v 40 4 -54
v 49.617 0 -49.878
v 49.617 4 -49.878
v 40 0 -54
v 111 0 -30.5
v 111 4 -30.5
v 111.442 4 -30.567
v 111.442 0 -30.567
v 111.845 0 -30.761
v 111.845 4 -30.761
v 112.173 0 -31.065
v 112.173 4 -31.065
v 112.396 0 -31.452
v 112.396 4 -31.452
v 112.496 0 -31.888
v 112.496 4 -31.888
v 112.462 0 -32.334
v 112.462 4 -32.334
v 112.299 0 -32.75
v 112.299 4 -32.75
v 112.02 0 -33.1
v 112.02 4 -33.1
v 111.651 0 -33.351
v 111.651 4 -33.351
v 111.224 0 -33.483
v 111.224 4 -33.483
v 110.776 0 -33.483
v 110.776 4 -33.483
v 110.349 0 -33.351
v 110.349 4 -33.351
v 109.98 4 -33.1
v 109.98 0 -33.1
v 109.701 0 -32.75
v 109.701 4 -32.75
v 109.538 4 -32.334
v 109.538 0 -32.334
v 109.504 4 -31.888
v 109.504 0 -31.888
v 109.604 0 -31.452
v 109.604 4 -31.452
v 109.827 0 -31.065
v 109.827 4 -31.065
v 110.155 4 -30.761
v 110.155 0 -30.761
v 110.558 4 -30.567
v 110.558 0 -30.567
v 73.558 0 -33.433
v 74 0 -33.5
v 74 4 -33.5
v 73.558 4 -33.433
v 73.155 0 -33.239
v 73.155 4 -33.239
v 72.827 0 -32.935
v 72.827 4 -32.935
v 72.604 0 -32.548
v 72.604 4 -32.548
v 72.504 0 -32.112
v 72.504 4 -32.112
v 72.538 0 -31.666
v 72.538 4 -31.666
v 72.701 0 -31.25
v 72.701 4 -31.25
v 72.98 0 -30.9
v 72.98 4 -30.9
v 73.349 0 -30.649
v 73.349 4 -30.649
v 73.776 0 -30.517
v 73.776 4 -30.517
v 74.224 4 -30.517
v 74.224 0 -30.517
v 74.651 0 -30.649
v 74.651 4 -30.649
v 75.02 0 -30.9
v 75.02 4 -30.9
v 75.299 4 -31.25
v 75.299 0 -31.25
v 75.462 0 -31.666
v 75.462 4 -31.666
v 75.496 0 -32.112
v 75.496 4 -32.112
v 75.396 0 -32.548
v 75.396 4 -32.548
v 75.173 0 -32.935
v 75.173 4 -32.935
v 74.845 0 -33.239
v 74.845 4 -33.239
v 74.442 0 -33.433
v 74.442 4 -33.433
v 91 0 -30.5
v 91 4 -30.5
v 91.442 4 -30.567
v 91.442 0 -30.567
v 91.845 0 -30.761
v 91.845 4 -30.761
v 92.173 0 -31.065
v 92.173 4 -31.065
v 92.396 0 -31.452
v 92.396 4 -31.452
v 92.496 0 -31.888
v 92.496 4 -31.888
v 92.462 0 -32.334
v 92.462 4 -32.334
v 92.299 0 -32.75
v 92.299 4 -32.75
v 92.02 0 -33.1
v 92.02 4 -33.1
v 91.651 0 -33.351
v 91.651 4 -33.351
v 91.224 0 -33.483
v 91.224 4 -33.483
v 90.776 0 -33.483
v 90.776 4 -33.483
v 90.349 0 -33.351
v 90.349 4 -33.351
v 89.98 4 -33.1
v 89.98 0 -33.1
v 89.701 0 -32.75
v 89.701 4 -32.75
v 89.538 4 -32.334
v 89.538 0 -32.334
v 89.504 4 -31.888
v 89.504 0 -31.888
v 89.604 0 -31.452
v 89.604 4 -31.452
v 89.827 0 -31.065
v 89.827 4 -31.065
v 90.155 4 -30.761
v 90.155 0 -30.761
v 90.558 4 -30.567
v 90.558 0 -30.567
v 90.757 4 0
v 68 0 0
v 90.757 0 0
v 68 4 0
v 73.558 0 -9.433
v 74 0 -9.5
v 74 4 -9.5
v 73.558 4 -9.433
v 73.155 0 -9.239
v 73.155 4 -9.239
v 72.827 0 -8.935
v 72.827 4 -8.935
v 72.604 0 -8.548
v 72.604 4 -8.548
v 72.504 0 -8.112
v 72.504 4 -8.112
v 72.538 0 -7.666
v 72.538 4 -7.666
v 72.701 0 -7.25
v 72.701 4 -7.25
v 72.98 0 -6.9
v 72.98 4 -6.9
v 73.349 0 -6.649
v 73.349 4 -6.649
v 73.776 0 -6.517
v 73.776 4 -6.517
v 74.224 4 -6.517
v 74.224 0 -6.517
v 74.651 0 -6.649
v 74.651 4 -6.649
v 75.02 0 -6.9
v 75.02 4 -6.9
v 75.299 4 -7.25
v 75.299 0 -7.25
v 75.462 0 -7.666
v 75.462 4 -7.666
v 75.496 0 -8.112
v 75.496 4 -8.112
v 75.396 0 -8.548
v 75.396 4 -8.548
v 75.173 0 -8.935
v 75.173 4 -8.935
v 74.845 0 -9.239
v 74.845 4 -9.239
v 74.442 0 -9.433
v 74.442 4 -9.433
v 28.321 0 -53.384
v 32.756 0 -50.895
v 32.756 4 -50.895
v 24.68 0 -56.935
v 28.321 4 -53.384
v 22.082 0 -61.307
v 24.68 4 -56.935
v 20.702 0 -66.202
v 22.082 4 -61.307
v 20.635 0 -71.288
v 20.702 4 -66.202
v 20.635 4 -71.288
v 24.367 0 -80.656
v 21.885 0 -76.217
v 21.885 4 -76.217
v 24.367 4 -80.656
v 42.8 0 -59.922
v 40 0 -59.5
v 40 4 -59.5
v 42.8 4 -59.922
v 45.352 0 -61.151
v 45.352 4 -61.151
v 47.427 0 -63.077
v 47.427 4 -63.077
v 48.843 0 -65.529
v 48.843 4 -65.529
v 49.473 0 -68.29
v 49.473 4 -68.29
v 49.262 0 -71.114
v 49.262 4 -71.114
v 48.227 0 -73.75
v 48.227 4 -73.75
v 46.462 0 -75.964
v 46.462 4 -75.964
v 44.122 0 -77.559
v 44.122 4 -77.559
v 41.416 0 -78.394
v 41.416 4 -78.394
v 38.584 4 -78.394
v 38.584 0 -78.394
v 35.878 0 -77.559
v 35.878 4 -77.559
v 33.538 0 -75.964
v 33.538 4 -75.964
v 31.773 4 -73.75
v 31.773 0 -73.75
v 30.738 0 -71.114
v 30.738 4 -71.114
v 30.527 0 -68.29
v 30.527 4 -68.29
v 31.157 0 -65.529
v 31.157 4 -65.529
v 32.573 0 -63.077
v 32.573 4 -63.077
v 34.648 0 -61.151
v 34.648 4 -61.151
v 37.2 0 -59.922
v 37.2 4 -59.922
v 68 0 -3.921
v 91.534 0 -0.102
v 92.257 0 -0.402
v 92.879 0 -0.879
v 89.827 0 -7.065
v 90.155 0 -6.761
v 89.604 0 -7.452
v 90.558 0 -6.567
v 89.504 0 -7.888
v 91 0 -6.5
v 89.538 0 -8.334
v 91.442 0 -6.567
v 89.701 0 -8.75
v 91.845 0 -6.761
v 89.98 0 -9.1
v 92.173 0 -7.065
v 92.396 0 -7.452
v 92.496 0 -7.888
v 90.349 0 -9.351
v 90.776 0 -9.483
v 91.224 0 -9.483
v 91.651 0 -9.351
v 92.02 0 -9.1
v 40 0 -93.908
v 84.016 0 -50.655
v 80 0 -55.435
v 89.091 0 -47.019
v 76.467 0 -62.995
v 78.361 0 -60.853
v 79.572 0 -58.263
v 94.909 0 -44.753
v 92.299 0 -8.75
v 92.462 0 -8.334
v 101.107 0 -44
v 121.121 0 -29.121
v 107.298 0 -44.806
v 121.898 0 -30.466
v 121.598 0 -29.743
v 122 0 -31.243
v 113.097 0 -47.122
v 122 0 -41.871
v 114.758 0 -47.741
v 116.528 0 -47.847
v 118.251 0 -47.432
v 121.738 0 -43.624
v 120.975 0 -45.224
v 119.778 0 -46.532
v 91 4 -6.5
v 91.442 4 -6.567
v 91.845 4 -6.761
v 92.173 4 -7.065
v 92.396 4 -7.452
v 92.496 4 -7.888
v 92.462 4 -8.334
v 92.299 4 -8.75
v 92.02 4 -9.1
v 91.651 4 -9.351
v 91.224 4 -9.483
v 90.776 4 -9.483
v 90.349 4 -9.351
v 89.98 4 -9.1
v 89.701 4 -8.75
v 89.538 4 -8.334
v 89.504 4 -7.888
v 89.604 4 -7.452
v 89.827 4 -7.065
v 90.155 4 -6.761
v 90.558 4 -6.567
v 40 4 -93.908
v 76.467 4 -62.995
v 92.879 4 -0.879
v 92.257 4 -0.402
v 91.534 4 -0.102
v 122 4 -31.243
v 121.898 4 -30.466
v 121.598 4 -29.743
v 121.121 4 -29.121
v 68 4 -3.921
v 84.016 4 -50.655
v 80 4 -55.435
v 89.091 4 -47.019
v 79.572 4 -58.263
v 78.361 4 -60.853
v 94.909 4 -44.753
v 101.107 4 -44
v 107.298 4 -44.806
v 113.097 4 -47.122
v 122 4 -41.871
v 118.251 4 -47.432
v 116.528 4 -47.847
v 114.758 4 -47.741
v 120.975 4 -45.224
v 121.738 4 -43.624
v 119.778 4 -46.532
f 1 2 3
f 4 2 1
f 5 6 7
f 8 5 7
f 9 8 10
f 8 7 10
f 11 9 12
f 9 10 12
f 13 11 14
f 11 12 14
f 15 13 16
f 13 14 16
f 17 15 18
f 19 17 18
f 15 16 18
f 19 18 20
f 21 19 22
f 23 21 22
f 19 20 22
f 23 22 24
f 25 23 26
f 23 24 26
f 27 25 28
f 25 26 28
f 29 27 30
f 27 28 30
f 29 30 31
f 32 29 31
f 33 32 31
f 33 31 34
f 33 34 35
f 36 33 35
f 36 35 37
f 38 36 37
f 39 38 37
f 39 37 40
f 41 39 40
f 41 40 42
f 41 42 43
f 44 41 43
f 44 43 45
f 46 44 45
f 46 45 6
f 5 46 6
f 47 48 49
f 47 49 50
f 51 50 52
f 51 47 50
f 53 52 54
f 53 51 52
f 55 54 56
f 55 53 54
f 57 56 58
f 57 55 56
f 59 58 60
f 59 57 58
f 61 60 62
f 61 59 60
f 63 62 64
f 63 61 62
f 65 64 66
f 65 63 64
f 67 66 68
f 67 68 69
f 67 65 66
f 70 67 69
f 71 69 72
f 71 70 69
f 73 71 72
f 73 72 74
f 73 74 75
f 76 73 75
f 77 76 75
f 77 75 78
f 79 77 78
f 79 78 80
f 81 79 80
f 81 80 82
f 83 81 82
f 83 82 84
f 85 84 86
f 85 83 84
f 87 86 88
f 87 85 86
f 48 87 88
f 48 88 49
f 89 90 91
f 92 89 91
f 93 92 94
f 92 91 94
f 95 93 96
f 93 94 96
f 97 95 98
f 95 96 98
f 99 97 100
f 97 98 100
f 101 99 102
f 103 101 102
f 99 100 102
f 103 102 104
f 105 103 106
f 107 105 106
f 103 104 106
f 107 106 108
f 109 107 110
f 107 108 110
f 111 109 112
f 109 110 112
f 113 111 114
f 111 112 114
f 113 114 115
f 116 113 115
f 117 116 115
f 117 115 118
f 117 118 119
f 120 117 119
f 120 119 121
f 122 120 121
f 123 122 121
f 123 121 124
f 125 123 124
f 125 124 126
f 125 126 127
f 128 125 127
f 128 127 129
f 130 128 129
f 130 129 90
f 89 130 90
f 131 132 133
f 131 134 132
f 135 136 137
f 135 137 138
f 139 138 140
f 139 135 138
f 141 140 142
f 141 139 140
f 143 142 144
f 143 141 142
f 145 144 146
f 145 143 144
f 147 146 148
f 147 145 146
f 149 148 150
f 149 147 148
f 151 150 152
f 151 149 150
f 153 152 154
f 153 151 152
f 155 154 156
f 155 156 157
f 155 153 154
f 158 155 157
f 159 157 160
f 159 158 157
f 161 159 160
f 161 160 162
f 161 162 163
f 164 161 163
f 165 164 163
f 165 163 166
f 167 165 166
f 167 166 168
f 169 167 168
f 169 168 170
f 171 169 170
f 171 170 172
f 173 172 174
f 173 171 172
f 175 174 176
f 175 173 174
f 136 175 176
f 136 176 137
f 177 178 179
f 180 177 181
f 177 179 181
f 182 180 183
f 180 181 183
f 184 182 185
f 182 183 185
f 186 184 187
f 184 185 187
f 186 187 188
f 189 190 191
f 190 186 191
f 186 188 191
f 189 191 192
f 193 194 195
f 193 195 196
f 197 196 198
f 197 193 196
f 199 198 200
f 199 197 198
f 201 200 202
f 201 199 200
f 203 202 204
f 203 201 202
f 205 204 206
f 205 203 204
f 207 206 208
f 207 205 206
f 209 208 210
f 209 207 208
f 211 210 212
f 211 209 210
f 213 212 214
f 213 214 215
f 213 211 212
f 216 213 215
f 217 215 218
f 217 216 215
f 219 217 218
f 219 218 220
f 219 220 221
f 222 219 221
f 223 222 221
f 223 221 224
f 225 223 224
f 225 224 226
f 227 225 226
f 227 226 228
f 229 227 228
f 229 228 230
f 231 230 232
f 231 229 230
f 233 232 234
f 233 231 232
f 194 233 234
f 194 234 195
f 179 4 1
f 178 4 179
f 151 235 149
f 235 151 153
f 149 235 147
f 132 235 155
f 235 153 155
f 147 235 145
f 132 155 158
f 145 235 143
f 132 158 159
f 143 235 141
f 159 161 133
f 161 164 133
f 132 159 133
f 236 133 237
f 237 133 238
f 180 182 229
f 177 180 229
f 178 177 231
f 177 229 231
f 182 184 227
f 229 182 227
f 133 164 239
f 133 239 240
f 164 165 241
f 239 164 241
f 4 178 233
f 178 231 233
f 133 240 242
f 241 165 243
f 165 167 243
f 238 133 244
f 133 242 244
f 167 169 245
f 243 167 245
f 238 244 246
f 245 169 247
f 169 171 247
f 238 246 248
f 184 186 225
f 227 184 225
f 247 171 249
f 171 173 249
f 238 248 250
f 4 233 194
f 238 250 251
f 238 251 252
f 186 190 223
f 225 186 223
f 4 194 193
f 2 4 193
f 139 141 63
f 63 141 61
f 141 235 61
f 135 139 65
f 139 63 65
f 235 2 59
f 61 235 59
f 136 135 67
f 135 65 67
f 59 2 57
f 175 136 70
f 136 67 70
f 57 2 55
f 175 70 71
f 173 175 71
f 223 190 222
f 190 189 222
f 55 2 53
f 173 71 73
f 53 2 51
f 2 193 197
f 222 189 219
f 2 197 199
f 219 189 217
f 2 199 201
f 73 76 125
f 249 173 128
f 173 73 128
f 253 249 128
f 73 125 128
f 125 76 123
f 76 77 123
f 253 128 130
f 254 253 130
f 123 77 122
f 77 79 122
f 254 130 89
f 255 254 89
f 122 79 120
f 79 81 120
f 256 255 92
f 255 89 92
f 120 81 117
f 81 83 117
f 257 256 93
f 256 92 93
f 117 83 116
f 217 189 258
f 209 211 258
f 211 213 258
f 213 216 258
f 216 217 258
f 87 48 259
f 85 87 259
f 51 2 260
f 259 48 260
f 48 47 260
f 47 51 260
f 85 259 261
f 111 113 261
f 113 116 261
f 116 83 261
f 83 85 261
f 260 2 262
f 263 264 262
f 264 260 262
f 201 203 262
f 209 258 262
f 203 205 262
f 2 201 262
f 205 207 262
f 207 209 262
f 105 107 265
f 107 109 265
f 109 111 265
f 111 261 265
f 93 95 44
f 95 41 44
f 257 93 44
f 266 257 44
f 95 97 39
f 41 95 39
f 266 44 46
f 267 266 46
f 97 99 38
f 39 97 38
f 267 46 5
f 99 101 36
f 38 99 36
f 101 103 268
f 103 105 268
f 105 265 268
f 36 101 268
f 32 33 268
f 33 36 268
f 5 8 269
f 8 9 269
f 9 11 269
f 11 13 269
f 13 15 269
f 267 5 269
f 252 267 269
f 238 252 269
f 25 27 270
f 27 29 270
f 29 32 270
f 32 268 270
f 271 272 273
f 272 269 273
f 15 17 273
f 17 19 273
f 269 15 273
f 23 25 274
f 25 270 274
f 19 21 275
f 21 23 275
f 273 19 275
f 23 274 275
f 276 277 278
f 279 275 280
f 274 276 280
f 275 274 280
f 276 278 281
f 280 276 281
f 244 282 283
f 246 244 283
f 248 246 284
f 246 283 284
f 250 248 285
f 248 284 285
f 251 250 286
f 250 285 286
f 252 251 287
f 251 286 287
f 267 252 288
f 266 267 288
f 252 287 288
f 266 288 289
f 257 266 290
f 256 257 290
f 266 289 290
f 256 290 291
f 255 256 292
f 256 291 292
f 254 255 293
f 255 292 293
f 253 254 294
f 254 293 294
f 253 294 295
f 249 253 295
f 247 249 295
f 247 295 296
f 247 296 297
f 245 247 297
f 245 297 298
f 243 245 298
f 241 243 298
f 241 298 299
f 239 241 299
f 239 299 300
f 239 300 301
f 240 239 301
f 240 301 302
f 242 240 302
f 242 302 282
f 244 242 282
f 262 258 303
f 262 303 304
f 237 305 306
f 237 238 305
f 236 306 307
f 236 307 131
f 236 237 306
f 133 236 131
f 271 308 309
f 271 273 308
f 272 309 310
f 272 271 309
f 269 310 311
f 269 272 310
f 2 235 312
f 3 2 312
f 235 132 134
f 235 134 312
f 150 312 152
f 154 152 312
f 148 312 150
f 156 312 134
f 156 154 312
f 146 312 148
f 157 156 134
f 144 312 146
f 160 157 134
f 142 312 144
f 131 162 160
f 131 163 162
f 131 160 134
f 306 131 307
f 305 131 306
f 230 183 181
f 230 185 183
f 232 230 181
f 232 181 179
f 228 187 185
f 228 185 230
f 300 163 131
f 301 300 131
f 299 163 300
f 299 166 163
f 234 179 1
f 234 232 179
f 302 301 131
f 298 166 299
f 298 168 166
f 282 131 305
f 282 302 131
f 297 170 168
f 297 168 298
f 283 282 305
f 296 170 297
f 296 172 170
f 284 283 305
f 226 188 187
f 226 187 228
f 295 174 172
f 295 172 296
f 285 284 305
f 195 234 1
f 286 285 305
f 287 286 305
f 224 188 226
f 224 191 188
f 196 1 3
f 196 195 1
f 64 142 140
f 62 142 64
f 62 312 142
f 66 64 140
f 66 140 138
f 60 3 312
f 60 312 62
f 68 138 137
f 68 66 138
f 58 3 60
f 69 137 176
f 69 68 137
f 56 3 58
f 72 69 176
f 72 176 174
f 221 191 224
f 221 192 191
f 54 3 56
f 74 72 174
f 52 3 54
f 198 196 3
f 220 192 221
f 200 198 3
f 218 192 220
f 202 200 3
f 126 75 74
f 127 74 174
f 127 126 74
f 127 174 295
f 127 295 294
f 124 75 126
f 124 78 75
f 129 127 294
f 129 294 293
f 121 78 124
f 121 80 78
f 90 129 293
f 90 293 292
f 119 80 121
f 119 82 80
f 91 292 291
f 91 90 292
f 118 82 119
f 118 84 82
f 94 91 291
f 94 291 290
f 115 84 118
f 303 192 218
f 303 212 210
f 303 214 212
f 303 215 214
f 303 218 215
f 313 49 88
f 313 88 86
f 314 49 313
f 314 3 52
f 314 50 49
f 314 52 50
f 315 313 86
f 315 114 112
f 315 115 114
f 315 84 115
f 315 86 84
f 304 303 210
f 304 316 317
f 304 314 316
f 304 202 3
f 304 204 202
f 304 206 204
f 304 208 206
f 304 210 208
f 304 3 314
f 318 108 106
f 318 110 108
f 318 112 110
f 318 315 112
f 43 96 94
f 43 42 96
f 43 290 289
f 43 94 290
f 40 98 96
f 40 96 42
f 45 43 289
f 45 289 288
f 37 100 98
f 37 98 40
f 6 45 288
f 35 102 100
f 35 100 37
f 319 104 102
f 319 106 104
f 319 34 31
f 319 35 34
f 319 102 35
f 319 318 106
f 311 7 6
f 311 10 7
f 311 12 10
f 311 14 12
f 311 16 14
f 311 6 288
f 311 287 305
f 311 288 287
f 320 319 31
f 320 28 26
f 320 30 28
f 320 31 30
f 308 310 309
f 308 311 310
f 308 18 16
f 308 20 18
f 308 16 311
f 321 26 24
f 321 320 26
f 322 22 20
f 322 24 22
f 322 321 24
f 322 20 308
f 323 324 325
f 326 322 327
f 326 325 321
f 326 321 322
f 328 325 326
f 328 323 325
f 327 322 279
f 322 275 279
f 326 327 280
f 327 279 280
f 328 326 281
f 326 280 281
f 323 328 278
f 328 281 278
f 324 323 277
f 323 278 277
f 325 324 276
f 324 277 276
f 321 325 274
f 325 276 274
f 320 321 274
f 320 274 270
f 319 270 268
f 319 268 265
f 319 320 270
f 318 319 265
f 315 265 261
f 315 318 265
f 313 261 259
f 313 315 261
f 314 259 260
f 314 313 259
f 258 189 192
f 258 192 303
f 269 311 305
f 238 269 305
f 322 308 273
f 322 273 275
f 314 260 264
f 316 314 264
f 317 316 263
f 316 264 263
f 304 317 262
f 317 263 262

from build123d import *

# Parameters (mm, degrees)
SKETCH_2_R          = 1.5
SKETCH_2_R_2        = 9.5
EXTRUDE_1_DEPTH     = 4
CUT_EXTRUDE_1_DEPTH = 124.429075185
EXTRUDE_2_DEPTH     = 4
SKETCH_7_R          = 1.5
CUT_EXTRUDE_2_DEPTH = 155.008884812
CUT_EXTRUDE_5_DEPTH = 155.008884812
FILLET_4_R          = 3
FILLET_5_R          = 6
FILLET_6_R          = 10
CHAMFER_1_SIZE      = 20
CHAMFER_1_SIZE2     = 38.078865529


with BuildPart() as part:
    # 草图2 → 凸台-拉伸1 (new body)
    with BuildSketch(Plane(origin=(0, 0, 0), x_dir=(1, 0, 0), z_dir=(0, 1, 0))):
        Polygon((0, 0), (0, 60), (40, 93.908128514), (80, 60), (80, 0), (68, 0), (68, 42), (40, 54), (12, 42), (12, 0), align=None)
        with Locations(Location((6, 32, 0), (0, 0, 270))):
            Circle(SKETCH_2_R, mode=Mode.SUBTRACT)
        with Locations(Location((6, 8, 0), (0, 0, 270))):
            Circle(SKETCH_2_R, mode=Mode.SUBTRACT)
        with Locations(Location((40, 69, 0), (0, 0, 270))):
            Circle(SKETCH_2_R_2, mode=Mode.SUBTRACT)
        with Locations(Location((74, 8, 0), (0, 0, 90))):
            Circle(SKETCH_2_R, mode=Mode.SUBTRACT)
        with Locations(Location((74, 32, 0), (0, 0, 90))):
            Circle(SKETCH_2_R, mode=Mode.SUBTRACT)
    extrude(amount=EXTRUDE_1_DEPTH)

    # 草图4 → 切除-拉伸1 (cut, through all)
    with BuildSketch(Plane(origin=(0, 4, 0), x_dir=(1, 0, 0), z_dir=(0, 1, 0))):
        with BuildLine():
            Line((24.36723091, 80.656179931), (0, 60))
            Line((0, 60), (0, 0))
            Line((0, 0), (12, 0))
            Line((12, 0), (12, 42))
            Line((12, 42), (32.756034747, 50.895443463))
            ThreePointArc((32.756034747, 50.895443463), (21.23136653, 63.709593809), (24.36723091, 80.656179931))
        make_face()
    extrude(amount=-CUT_EXTRUDE_1_DEPTH, mode=Mode.SUBTRACT)

    # 草图6 → 凸台-拉伸2 (add)
    with BuildSketch(Plane(origin=(0, 4, 0), x_dir=(1, 0, 0), z_dir=(0, 1, 0))):
        with BuildLine():
            ThreePointArc((122, 55.435340034), (101, 44), (80, 55.435340034))
            Line((80, 55.435340034), (80, 0))
            Line((80, 0), (122, 0))
            Line((122, 0), (122, 55.435340034))
        make_face()
    extrude(amount=-EXTRUDE_2_DEPTH)

    # 草图7 → 切除-拉伸2 (cut, through all)
    with BuildSketch(Plane(origin=(0, 4, 0), x_dir=(1, 0, 0), z_dir=(0, 1, 0))):
        with Locations(Location((91, 32, 0), (0, 0, 270))):
            Circle(SKETCH_7_R)
        with Locations(Location((74, 32, 0), (0, 0, 90))):
            Circle(SKETCH_7_R)
        with Locations(Location((74, 8, 0), (0, 0, 90))):
            Circle(SKETCH_7_R)
        with Locations(Location((111, 32, 0), (0, 0, 270))):
            Circle(SKETCH_7_R)
        with Locations(Location((111, 8, 0), (0, 0, 270))):
            Circle(SKETCH_7_R)
        with Locations(Location((91, 8, 0), (0, 0, 270))):
            Circle(SKETCH_7_R)
    extrude(amount=-CUT_EXTRUDE_2_DEPTH, mode=Mode.SUBTRACT)

    # 草图9 → 切除-拉伸5 (cut, through all)
    with BuildSketch(Plane(origin=(0, 4, 0), x_dir=(1, 0, 0), z_dir=(0, 1, 0))):
        Polygon((122, 30), (92, 0), (122, 0), align=None)
    extrude(amount=-CUT_EXTRUDE_5_DEPTH, mode=Mode.SUBTRACT)

    # 圆角4
    fillet_4_edges = [part.edges().sort_by_distance(p)[0] for p in [
        (122, 2, -30),
        (92, 2, 0),
    ]]
    fillet(fillet_4_edges, radius=FILLET_4_R)

    # 圆角5
    fillet_5_edges = [part.edges().sort_by_distance(p)[0] for p in [
        (122, 2, -55.435340034),
    ]]
    fillet(fillet_5_edges, radius=FILLET_5_R)

    # 圆角6
    # the kernel refuses this fillet: 10 mm, written as the material it takes off along each edge
    with BuildSketch(Plane(origin=(80, -11.580514233, -60), x_dir=(0, 0, 1), z_dir=(0, 1, 0))) as fillet_6_piece_1:
        with BuildLine():
            CenterArc((4.632705448, -9.999768488), FILLET_6_R, 90.389874902, 49.322073547)
            Line((-2.995326497, -3.5334613), (-3.147887136, -3.404135157))
            Line((-3.147887136, -3.404135157), (-0.152560639, 0.129326144))
            Line((-0.152560639, 0.129326144), (0, 0.2))
            ThreePointArc((0, 0.2), (2.282329983, 0.2), (4.563299057, 0.19999537))
            Line((4.563299057, 0.19999537), (4.564659966, 0))
        make_face()
    extrude(amount=27.161028465, mode=Mode.SUBTRACT)

    # 倒角1
    chamfer_1_edges = [part.edges().sort_by_distance(p)[0] for p in [
        (68, 2, -42),
    ]]
    chamfer_1_side = [part.faces().sort_by_distance(p)[0] for p in [
        (54, 2, -48),
    ]]
    chamfer(chamfer_1_edges, length=CHAMFER_1_SIZE, length2=CHAMFER_1_SIZE2, reference=chamfer_1_side[0])


solid = part.part
